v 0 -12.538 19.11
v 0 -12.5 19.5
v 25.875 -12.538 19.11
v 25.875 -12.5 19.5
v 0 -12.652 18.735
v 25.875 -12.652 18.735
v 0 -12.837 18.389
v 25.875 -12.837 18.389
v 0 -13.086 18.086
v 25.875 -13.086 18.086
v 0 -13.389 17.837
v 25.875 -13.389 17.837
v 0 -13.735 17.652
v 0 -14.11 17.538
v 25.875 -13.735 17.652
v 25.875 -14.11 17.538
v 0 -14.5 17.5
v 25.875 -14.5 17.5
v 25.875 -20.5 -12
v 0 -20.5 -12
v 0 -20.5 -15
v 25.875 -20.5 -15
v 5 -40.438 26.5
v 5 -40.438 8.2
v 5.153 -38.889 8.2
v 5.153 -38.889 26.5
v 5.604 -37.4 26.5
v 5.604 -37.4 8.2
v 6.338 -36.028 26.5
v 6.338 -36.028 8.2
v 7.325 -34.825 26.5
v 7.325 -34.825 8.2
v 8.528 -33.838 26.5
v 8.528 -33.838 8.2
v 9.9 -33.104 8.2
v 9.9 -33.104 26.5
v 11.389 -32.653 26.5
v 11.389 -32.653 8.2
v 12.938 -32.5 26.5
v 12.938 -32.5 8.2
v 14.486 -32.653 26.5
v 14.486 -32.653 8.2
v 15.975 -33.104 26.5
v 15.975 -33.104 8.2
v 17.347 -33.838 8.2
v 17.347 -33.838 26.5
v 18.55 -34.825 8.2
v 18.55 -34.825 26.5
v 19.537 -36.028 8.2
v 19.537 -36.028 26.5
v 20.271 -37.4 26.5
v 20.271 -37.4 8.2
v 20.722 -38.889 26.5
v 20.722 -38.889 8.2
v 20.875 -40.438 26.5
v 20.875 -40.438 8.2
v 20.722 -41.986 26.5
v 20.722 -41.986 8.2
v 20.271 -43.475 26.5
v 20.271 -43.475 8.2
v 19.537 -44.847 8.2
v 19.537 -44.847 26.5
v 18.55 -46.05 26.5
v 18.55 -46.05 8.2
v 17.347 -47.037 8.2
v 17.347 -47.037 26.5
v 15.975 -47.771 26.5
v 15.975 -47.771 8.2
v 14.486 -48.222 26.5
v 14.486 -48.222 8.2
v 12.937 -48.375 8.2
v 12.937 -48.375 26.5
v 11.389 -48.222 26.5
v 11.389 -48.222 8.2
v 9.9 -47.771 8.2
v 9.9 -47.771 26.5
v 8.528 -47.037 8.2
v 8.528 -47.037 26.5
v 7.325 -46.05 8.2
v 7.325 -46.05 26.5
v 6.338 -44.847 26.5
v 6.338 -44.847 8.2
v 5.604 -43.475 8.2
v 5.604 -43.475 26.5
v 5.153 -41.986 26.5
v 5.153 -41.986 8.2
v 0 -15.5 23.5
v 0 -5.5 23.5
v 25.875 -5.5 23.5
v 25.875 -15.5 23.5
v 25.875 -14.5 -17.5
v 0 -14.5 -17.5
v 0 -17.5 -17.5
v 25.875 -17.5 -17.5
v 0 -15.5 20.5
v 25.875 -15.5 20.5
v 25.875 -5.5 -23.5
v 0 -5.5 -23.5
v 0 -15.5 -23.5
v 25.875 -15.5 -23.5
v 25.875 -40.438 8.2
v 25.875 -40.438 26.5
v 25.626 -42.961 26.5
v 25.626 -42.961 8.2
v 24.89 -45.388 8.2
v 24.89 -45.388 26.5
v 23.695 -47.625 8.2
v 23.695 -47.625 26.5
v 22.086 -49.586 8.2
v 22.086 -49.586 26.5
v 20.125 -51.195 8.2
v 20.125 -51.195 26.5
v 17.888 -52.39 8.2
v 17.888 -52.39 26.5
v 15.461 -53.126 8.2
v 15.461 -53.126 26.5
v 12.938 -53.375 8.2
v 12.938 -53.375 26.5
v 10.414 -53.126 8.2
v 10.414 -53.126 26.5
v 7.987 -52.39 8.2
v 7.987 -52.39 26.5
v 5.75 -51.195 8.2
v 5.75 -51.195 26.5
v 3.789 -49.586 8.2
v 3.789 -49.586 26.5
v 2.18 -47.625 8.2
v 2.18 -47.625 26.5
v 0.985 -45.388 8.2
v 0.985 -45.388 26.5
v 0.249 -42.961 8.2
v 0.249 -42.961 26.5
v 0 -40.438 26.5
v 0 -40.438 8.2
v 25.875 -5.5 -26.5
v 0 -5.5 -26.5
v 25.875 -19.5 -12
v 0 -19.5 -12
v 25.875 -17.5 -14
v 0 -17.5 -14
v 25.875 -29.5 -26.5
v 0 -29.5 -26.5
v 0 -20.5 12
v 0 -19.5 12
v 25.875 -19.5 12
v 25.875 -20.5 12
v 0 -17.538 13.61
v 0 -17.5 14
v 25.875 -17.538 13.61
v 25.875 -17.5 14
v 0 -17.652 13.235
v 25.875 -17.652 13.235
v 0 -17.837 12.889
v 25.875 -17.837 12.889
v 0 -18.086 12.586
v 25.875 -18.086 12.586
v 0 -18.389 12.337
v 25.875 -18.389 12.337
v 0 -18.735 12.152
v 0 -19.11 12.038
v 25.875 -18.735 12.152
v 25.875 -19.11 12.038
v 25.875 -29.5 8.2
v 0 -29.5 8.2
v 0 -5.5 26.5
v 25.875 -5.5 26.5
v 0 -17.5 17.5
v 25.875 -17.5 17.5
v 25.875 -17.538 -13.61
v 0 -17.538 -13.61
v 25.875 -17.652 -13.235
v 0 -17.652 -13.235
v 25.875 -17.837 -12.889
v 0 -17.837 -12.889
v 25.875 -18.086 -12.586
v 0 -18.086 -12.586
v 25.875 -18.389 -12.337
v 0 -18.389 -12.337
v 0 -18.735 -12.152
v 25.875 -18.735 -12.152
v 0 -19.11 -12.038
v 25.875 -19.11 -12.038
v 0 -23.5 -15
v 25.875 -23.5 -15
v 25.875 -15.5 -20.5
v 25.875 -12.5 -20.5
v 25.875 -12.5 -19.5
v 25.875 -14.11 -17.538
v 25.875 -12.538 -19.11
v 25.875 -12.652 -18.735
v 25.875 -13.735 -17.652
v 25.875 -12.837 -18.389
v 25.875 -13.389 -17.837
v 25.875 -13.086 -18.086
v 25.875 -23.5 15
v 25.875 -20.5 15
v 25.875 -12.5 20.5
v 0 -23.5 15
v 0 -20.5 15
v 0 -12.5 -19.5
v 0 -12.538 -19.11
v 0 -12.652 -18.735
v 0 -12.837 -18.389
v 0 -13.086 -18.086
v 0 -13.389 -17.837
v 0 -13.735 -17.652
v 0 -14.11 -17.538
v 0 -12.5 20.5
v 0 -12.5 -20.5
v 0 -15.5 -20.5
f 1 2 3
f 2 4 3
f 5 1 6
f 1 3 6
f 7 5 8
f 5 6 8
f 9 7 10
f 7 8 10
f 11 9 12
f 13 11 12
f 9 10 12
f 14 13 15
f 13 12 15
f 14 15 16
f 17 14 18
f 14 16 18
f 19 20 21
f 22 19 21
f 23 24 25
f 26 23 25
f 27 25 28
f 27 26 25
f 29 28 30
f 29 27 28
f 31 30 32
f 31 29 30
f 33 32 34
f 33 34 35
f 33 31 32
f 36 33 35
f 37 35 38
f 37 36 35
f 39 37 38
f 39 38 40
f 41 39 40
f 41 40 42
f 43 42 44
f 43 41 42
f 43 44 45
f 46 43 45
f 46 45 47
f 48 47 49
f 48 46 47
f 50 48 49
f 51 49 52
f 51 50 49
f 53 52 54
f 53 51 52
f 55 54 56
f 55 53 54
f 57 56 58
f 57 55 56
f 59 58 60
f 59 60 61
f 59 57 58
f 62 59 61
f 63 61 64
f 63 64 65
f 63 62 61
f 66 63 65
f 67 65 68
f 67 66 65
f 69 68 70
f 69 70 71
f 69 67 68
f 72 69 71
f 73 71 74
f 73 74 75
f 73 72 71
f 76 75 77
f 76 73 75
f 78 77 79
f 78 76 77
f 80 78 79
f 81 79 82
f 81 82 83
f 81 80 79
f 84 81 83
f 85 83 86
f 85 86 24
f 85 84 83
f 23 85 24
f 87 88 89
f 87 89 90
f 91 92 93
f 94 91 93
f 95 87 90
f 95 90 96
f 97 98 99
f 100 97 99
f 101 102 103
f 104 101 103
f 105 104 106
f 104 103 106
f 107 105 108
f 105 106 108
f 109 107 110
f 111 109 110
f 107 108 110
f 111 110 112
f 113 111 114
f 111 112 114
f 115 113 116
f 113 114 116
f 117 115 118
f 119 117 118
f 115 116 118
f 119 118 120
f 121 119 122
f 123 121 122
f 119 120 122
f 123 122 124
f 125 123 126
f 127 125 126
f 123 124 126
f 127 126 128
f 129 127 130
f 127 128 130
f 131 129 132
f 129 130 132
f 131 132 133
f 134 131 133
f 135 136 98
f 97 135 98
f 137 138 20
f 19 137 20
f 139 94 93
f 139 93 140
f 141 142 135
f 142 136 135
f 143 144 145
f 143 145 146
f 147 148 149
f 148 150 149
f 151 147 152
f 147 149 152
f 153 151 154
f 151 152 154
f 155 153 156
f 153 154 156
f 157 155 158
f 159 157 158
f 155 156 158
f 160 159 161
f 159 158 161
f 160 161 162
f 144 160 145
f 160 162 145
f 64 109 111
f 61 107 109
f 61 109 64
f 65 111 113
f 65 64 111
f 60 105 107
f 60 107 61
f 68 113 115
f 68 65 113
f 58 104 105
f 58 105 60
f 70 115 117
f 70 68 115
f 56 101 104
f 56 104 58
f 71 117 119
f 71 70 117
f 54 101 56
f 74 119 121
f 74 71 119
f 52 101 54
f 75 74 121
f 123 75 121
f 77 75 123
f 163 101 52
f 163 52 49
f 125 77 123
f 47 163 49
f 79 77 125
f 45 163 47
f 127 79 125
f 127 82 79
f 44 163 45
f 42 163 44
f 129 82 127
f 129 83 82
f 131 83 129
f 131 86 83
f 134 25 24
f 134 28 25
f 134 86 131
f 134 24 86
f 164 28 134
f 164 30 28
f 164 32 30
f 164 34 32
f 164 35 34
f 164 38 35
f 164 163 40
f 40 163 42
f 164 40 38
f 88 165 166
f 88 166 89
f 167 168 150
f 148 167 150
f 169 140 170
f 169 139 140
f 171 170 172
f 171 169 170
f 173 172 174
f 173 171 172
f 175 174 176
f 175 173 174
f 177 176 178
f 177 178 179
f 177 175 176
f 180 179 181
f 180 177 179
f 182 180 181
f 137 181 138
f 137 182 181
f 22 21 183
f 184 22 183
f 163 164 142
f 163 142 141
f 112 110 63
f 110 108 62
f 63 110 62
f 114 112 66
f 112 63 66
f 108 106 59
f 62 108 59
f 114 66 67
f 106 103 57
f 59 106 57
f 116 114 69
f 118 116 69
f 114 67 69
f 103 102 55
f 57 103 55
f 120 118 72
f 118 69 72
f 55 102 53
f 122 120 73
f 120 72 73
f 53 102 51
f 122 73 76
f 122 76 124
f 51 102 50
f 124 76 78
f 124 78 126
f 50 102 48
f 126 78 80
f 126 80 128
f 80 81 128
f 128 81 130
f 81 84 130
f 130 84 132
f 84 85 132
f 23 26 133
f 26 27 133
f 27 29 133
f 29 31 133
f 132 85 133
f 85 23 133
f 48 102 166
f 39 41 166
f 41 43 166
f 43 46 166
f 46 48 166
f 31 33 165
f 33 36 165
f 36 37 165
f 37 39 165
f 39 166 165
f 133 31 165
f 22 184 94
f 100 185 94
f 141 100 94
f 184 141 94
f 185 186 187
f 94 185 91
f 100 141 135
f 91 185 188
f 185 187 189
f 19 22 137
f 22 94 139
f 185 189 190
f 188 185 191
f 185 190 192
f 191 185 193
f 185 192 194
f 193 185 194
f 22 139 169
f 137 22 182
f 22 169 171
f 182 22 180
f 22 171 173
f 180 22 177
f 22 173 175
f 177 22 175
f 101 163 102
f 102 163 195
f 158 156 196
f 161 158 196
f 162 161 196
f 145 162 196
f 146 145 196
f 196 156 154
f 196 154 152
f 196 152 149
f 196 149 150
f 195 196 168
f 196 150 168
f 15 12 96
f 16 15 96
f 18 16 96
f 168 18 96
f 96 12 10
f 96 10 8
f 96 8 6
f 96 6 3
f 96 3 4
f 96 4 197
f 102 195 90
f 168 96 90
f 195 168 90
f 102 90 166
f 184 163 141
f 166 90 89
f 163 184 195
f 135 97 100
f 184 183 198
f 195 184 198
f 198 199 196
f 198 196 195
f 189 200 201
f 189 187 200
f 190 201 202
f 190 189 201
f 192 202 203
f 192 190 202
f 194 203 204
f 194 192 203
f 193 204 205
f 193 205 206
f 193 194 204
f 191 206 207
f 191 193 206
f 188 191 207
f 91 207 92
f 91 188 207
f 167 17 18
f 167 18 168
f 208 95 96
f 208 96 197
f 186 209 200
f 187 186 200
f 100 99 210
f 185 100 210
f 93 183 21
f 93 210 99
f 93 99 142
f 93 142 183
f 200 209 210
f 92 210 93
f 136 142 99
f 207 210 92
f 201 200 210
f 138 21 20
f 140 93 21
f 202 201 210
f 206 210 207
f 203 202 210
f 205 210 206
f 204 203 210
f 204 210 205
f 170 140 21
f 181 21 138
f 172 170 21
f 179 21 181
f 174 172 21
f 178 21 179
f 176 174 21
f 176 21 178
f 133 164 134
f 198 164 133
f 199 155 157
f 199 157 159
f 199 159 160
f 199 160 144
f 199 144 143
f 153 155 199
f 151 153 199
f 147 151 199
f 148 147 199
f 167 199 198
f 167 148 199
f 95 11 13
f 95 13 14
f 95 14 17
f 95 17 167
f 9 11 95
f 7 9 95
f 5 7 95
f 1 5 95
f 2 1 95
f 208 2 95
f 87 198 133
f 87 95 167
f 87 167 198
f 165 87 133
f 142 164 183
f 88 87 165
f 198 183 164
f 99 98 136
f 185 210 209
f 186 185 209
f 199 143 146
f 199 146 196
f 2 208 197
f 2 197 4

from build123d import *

# Parameters (mm, degrees)
BOSS_EXTRUDE1_DEPTH = 25.875
FILLET1_R           = 2
SKETCH2_R           = 7.9375
BOSS_EXTRUDE2_DEPTH = 18.3
SKETCH3_W           = 25.875
SKETCH3_H           = 34.7
BOSS_EXTRUDE3_DEPTH = 2


with BuildPart() as part:
    # Sketch1 → Boss-Extrude1 (new body)
    with BuildSketch(Plane(origin=(0, 0, 0), x_dir=(0, 0, -1), z_dir=(1, 0, 0))):
        Polygon((-26.5, -27.5), (-26.5, -5.5), (-23.5, -5.5), (-23.5, -15.5), (-20.5, -15.5), (-20.5, -12.5), (-17.5, -12.5), (-17.5, -17.5), (-12, -17.5), (-12, -20.5), (-15, -20.5), (-15, -23.5), (0, -23.5), (0, -27.5), align=None)
    extrude(amount=BOSS_EXTRUDE1_DEPTH)

    # Fillet1
    fillet1_edges = [part.edges().sort_by_distance(p)[0] for p in [
        (12.9375, -12.5, 17.5),
        (12.9375, -17.5, 12),
    ]]
    fillet(fillet1_edges, radius=FILLET1_R)

    # Mirror1: part across plane


with BuildPart() as part_1:
    add(part.part)
    add(part.part.mirror(Plane(origin=(25.875, -23.5, 0), x_dir=(1, 0, 0), z_dir=(0, 0, 1))))

    # Sketch2 → Boss-Extrude2 (add)
    with BuildSketch(Plane(origin=(0, 0, 26.5), x_dir=(-1, 0, 0), z_dir=(0, 0, -1))):
        with BuildLine():
            Line((-25.875, -27.5), (-25.875, -40.4375))
            ThreePointArc((-25.875, -40.4375), (-12.9375, -53.375), (0, -40.4375))
            Line((0, -40.4375), (0, -27.5))
            Line((0, -27.5), (0, -23.5))
            Line((0, -23.5), (-25.875, -23.5))
            Line((-25.875, -23.5), (-25.875, -27.5))
        make_face()
        with Locations((-12.9375, -40.4375)):
            Circle(SKETCH2_R, mode=Mode.SUBTRACT)
    extrude(amount=BOSS_EXTRUDE2_DEPTH)

    # Sketch3 → Boss-Extrude3 (add)
    with BuildSketch(Plane.XZ.offset(27.5)):
        with Locations((12.9375, -9.15)):
            Rectangle(SKETCH3_W, SKETCH3_H)
    extrude(amount=BOSS_EXTRUDE3_DEPTH)


solid = part_1.part
